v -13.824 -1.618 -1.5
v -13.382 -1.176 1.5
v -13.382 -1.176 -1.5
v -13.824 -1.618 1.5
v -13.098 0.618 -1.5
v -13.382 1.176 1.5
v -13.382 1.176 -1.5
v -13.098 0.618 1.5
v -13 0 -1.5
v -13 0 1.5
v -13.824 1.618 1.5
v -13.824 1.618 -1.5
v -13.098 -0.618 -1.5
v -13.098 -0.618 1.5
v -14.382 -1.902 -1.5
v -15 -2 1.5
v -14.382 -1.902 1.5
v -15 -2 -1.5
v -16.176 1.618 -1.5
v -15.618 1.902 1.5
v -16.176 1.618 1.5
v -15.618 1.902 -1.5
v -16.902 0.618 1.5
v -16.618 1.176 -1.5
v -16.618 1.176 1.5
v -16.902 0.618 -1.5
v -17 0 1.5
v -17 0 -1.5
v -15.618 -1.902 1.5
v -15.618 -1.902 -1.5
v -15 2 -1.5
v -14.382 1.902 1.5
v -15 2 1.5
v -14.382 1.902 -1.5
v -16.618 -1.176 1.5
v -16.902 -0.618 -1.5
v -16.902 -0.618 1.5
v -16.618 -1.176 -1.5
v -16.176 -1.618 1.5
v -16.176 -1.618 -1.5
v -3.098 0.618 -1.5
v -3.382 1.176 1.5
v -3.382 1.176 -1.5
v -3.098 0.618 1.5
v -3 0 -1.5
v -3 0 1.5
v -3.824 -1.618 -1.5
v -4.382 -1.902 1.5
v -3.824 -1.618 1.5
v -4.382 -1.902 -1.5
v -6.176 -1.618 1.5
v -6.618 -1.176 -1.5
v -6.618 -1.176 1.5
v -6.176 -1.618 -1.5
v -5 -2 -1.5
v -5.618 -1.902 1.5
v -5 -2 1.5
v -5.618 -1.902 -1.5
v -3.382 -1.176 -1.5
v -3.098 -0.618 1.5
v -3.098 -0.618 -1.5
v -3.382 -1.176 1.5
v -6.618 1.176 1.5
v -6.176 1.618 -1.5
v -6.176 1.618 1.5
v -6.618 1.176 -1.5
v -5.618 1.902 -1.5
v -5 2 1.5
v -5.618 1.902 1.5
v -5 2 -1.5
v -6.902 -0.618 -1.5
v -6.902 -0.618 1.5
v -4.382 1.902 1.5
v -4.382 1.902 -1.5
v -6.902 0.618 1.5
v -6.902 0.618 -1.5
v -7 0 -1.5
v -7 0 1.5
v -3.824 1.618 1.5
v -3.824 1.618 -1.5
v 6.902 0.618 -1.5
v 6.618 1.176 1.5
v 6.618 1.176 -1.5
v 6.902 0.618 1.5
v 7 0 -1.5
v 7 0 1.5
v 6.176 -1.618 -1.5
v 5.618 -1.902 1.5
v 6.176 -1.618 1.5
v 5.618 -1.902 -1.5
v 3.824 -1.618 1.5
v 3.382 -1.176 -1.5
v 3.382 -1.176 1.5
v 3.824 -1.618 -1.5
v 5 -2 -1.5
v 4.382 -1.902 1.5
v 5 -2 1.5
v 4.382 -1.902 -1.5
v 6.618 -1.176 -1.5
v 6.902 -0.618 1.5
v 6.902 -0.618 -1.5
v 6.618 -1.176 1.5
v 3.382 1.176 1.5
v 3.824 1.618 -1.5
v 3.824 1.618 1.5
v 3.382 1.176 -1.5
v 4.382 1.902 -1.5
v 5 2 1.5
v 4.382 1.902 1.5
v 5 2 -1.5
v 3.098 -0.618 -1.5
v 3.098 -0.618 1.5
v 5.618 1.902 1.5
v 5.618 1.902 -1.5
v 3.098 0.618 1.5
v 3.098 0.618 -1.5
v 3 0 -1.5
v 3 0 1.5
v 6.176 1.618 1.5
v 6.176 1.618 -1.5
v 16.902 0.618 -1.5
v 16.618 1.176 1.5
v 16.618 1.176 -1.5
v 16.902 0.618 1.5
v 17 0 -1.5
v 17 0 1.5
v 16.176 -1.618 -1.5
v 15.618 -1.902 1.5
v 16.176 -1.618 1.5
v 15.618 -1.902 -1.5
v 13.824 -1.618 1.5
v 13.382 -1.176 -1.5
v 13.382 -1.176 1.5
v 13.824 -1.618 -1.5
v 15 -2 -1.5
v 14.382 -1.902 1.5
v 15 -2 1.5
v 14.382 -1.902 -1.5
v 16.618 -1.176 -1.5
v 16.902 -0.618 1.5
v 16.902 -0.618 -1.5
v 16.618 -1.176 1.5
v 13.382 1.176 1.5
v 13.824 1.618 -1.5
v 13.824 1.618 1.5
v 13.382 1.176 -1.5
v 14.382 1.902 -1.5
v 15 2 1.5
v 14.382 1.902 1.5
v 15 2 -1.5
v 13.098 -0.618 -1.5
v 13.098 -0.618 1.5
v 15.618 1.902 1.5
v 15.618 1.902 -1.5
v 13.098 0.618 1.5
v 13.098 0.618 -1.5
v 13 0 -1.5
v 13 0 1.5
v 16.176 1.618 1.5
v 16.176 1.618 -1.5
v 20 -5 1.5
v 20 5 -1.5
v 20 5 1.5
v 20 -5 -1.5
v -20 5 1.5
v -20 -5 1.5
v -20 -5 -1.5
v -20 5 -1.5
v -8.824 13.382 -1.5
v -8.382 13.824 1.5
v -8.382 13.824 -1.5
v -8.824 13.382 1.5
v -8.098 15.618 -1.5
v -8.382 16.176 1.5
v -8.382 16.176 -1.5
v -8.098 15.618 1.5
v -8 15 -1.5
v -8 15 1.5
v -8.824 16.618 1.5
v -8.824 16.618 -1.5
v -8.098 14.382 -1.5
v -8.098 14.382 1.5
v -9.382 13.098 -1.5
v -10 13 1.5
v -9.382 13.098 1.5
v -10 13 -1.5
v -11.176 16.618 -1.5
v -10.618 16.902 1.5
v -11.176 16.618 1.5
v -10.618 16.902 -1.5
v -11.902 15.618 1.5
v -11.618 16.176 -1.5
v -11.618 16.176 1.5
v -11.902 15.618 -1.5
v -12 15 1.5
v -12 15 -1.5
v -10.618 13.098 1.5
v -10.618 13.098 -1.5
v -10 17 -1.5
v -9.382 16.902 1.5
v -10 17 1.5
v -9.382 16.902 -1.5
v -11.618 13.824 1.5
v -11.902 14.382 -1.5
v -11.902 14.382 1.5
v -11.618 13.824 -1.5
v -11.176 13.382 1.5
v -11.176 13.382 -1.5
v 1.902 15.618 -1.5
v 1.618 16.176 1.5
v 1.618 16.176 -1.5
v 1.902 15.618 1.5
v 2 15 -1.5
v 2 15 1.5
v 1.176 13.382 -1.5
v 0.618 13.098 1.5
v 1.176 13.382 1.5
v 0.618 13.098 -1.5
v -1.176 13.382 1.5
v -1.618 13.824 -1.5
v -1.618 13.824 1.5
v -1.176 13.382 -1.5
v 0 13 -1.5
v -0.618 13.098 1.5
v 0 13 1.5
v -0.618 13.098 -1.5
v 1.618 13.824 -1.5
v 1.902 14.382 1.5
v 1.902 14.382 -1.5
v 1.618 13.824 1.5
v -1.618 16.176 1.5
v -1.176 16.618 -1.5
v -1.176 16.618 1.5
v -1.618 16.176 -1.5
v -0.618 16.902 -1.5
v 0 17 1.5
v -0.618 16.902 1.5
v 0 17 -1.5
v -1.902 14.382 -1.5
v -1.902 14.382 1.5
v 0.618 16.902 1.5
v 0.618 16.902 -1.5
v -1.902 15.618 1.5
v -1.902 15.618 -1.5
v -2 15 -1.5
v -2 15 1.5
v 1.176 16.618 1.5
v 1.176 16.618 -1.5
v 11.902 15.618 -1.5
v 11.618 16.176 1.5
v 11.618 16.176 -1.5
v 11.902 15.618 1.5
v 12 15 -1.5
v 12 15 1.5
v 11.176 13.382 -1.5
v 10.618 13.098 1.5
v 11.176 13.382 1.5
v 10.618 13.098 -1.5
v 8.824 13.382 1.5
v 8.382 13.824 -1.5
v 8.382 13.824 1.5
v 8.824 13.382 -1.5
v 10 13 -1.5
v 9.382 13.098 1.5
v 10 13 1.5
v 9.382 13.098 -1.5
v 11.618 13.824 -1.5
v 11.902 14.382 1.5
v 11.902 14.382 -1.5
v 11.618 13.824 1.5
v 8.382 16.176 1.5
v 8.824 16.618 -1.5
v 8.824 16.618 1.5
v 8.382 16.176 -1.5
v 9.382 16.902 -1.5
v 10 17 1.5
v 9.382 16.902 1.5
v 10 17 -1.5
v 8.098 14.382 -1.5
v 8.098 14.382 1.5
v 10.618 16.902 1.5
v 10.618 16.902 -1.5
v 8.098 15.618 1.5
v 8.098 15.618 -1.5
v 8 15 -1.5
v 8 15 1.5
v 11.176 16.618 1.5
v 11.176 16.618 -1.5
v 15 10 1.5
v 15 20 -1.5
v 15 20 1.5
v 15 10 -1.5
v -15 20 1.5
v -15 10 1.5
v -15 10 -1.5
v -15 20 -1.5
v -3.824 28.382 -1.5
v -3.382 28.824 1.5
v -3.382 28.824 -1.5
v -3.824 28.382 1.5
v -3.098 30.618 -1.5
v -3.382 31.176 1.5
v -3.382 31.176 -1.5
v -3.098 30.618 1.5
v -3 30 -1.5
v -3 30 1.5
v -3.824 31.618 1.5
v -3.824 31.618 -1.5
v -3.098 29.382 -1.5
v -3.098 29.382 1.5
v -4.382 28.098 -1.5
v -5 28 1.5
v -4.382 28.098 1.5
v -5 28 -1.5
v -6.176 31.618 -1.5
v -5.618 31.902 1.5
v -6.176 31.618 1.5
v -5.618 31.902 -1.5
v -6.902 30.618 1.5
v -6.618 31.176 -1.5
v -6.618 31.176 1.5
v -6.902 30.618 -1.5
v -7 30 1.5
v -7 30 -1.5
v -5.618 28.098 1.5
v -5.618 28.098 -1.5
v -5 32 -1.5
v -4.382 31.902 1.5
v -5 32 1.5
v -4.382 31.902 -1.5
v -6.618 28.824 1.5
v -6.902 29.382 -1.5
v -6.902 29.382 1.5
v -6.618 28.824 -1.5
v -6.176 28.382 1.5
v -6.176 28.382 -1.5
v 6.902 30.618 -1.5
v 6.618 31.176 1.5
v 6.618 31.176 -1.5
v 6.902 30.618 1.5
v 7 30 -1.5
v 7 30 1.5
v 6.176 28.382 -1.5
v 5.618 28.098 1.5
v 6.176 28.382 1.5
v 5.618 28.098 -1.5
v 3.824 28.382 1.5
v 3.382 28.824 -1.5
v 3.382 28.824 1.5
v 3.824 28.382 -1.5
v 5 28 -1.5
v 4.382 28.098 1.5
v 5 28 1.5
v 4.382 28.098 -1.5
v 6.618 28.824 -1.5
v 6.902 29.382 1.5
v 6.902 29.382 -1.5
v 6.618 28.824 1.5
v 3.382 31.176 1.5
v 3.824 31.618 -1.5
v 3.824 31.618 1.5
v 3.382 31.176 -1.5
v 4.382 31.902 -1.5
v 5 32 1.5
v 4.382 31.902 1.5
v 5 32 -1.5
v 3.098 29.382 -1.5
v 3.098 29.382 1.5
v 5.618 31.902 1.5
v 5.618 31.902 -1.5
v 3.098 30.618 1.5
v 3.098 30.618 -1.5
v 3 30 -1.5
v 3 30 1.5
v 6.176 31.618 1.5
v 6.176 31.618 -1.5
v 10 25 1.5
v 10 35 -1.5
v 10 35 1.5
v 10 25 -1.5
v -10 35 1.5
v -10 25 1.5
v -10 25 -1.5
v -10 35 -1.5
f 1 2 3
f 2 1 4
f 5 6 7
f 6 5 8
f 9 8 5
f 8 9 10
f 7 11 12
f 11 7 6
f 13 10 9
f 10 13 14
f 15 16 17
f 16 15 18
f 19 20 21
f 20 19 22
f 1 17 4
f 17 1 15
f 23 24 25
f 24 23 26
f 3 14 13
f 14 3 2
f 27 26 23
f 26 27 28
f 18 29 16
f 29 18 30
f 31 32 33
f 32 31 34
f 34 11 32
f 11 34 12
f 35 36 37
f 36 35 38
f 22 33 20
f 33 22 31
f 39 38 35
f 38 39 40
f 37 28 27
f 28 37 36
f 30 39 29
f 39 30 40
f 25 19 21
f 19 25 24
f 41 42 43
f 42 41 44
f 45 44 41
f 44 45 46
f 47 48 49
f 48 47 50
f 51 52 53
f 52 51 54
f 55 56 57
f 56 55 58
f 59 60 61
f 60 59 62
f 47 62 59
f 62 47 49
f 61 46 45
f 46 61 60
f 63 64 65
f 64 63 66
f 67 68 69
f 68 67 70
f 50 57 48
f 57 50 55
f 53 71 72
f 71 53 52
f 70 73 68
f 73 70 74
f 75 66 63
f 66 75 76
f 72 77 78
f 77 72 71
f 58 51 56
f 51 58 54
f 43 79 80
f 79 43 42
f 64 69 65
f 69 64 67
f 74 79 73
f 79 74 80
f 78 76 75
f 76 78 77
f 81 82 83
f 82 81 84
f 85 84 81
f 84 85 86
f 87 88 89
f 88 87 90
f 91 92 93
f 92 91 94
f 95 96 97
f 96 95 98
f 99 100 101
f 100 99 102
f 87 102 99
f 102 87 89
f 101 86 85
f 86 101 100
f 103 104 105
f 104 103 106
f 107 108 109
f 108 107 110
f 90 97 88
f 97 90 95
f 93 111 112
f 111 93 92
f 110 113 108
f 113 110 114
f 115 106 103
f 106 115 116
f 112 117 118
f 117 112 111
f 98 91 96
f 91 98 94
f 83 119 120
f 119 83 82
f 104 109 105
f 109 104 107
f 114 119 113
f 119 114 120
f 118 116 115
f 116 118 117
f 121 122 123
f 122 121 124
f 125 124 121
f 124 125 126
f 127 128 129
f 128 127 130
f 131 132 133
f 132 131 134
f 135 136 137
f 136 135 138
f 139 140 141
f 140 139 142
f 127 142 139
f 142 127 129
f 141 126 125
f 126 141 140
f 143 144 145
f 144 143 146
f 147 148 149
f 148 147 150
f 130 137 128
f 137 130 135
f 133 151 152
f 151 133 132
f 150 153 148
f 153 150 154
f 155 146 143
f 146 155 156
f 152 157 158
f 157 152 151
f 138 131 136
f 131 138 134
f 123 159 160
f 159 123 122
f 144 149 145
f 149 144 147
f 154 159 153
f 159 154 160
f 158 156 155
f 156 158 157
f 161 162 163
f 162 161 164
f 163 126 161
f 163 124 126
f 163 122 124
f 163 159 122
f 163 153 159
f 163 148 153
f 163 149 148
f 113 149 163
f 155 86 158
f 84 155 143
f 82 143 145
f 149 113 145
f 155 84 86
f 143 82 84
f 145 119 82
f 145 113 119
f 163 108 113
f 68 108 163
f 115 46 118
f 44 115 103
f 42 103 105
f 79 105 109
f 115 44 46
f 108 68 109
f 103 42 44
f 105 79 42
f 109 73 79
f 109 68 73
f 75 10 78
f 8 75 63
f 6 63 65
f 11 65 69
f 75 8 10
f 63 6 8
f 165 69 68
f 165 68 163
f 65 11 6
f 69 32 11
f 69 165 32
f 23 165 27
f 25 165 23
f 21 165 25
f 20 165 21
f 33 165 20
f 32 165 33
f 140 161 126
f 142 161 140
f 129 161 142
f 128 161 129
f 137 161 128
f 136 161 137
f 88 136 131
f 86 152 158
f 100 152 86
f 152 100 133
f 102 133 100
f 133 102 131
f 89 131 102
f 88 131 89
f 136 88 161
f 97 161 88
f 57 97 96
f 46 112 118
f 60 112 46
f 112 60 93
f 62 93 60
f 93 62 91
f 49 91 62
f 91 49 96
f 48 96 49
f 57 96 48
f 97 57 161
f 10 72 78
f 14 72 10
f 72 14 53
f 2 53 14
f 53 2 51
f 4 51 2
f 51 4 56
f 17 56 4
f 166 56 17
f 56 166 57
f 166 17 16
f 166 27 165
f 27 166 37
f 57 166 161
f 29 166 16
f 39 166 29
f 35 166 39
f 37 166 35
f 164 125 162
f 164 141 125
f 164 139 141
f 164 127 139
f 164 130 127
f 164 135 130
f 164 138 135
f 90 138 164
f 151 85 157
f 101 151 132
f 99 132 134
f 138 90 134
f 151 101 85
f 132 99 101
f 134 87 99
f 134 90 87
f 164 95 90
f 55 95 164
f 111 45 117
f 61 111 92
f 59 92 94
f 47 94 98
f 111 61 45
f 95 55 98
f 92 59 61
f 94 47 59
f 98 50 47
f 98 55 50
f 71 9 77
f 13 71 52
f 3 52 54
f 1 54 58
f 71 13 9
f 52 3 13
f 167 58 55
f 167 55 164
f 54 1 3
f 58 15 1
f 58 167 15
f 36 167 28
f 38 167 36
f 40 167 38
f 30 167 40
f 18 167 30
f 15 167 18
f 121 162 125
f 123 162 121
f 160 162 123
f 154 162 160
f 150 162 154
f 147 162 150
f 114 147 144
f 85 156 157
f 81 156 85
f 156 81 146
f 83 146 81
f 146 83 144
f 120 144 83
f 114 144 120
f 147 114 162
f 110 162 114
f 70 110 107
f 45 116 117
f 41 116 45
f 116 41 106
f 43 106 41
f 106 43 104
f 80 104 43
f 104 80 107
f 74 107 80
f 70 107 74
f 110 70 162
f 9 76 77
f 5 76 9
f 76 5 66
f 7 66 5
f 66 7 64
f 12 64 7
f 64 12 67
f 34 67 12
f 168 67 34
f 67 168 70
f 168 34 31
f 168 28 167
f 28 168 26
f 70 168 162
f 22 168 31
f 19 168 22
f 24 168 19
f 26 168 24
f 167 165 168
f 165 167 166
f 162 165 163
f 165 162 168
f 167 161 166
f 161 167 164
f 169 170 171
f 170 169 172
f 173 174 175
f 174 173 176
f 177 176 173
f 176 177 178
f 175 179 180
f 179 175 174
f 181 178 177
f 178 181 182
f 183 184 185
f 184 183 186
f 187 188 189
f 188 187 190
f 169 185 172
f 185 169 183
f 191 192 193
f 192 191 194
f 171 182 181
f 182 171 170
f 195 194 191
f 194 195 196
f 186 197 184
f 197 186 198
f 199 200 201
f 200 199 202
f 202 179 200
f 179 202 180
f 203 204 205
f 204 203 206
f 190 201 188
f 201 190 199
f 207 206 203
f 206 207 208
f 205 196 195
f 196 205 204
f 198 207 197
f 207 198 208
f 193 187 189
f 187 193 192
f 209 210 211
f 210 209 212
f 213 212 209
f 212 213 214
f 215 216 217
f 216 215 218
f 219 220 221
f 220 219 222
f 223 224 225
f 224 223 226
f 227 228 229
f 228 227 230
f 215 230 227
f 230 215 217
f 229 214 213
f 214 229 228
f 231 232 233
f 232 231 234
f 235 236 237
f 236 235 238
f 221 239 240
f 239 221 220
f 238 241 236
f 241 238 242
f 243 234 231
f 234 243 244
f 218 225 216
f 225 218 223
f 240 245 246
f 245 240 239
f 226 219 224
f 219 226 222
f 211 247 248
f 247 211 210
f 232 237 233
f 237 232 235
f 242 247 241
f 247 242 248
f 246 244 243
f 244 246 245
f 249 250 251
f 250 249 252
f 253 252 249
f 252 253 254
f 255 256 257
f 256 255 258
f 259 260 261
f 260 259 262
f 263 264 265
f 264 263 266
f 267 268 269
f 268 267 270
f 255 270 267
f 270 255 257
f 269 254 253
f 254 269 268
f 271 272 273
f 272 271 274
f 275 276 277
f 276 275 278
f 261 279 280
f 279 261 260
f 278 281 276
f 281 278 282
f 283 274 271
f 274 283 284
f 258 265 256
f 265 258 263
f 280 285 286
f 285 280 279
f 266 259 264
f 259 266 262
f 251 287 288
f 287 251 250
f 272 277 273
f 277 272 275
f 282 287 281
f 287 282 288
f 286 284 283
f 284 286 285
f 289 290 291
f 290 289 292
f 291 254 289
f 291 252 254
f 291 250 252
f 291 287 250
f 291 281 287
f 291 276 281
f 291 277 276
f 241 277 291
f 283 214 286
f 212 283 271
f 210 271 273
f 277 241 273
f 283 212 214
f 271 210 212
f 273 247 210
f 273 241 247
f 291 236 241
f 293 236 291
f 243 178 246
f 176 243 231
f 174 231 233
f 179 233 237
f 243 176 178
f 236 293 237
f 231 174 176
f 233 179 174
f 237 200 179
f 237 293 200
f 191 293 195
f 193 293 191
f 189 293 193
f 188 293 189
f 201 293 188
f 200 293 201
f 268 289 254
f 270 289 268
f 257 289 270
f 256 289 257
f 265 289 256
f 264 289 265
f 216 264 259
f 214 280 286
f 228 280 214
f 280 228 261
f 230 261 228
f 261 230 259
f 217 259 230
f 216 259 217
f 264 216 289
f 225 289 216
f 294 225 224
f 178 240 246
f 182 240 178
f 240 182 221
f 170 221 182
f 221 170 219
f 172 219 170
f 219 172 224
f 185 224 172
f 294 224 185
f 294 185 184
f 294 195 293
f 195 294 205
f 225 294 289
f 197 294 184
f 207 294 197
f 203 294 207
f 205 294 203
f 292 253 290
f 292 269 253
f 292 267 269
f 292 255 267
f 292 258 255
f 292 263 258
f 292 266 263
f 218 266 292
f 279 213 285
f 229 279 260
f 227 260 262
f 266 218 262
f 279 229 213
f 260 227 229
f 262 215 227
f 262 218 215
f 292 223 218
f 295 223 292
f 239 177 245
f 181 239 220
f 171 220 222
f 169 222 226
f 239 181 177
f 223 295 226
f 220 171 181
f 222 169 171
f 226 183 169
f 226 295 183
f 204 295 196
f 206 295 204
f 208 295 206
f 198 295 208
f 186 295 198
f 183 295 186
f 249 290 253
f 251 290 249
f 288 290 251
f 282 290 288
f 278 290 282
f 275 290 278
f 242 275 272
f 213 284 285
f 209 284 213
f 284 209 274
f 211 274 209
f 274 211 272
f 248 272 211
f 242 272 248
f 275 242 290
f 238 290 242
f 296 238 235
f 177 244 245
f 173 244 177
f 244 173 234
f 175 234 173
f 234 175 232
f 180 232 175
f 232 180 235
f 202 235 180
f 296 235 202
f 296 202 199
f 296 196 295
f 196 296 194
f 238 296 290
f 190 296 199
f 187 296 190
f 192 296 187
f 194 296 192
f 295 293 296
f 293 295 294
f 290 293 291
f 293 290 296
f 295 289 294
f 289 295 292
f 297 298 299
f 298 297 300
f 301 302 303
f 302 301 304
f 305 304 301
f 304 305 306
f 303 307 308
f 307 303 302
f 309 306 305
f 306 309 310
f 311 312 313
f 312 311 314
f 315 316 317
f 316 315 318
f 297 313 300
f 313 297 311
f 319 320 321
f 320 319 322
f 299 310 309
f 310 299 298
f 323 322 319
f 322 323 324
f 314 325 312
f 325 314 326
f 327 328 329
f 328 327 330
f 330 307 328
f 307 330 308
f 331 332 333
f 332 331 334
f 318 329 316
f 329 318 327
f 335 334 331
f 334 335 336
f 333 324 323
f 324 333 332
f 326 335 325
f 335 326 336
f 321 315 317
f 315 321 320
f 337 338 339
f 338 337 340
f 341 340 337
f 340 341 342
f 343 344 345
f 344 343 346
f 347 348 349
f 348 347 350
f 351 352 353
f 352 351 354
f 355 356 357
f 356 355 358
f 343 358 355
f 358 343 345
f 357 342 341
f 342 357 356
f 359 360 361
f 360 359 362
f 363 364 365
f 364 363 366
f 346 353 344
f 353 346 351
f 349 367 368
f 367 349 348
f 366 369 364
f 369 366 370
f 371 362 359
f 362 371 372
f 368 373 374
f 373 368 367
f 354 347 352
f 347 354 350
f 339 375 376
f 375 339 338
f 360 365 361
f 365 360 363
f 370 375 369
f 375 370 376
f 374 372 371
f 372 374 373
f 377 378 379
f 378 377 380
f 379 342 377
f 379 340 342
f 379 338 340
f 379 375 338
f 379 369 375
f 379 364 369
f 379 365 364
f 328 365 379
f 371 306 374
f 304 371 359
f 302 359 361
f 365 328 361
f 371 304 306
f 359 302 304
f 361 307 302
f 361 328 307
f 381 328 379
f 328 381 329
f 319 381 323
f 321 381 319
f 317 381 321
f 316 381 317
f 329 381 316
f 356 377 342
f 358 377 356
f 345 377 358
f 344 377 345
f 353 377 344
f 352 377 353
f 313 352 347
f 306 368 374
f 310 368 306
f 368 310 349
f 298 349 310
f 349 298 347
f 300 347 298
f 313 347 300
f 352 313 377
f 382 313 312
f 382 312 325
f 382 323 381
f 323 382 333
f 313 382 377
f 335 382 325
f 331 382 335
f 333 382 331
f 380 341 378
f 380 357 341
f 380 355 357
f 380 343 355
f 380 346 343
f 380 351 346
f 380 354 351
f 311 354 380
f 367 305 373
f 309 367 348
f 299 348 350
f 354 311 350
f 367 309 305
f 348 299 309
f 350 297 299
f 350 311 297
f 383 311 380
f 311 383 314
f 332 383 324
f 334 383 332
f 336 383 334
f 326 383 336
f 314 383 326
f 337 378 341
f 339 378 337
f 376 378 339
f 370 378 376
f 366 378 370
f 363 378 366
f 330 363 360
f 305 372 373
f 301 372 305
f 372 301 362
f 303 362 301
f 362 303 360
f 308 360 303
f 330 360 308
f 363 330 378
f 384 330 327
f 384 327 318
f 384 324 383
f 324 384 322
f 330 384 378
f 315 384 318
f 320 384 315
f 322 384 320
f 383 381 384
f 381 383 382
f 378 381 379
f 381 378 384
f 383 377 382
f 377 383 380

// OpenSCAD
// file: 12.Pieza de mecano parametrizable 2.scad
module pieza_mecano(n=4,drill=4,d=10,anchura=10,grosor=3){
    //-- Calcular longitud pieza
    lx=n*d;
    
    //-- Construir la pieza
    difference(){
        //-- Cuerpo de la pieza
        cube([lx,anchura,grosor],center=true);
        
        //-- Taladros
        translate([-lx/2+d/2,0,0])
            for(i=[0:n-1]){
                translate([i*d,0,0])
                    cylinder(r=drill/2,h=grosor+5,$fn=20,center=true);
            }
    }
}

//-- Ejemplos de utilización
pieza_mecano();

translate([0,20,0])
    pieza_mecano(n=2);
// main file
use <12.Pieza de mecano parametrizable 2.scad> 

pieza_mecano(); 

translate([0,15,0])
  pieza_mecano(n=3); 

translate([0,30,0])
  pieza_mecano(n=2); 
